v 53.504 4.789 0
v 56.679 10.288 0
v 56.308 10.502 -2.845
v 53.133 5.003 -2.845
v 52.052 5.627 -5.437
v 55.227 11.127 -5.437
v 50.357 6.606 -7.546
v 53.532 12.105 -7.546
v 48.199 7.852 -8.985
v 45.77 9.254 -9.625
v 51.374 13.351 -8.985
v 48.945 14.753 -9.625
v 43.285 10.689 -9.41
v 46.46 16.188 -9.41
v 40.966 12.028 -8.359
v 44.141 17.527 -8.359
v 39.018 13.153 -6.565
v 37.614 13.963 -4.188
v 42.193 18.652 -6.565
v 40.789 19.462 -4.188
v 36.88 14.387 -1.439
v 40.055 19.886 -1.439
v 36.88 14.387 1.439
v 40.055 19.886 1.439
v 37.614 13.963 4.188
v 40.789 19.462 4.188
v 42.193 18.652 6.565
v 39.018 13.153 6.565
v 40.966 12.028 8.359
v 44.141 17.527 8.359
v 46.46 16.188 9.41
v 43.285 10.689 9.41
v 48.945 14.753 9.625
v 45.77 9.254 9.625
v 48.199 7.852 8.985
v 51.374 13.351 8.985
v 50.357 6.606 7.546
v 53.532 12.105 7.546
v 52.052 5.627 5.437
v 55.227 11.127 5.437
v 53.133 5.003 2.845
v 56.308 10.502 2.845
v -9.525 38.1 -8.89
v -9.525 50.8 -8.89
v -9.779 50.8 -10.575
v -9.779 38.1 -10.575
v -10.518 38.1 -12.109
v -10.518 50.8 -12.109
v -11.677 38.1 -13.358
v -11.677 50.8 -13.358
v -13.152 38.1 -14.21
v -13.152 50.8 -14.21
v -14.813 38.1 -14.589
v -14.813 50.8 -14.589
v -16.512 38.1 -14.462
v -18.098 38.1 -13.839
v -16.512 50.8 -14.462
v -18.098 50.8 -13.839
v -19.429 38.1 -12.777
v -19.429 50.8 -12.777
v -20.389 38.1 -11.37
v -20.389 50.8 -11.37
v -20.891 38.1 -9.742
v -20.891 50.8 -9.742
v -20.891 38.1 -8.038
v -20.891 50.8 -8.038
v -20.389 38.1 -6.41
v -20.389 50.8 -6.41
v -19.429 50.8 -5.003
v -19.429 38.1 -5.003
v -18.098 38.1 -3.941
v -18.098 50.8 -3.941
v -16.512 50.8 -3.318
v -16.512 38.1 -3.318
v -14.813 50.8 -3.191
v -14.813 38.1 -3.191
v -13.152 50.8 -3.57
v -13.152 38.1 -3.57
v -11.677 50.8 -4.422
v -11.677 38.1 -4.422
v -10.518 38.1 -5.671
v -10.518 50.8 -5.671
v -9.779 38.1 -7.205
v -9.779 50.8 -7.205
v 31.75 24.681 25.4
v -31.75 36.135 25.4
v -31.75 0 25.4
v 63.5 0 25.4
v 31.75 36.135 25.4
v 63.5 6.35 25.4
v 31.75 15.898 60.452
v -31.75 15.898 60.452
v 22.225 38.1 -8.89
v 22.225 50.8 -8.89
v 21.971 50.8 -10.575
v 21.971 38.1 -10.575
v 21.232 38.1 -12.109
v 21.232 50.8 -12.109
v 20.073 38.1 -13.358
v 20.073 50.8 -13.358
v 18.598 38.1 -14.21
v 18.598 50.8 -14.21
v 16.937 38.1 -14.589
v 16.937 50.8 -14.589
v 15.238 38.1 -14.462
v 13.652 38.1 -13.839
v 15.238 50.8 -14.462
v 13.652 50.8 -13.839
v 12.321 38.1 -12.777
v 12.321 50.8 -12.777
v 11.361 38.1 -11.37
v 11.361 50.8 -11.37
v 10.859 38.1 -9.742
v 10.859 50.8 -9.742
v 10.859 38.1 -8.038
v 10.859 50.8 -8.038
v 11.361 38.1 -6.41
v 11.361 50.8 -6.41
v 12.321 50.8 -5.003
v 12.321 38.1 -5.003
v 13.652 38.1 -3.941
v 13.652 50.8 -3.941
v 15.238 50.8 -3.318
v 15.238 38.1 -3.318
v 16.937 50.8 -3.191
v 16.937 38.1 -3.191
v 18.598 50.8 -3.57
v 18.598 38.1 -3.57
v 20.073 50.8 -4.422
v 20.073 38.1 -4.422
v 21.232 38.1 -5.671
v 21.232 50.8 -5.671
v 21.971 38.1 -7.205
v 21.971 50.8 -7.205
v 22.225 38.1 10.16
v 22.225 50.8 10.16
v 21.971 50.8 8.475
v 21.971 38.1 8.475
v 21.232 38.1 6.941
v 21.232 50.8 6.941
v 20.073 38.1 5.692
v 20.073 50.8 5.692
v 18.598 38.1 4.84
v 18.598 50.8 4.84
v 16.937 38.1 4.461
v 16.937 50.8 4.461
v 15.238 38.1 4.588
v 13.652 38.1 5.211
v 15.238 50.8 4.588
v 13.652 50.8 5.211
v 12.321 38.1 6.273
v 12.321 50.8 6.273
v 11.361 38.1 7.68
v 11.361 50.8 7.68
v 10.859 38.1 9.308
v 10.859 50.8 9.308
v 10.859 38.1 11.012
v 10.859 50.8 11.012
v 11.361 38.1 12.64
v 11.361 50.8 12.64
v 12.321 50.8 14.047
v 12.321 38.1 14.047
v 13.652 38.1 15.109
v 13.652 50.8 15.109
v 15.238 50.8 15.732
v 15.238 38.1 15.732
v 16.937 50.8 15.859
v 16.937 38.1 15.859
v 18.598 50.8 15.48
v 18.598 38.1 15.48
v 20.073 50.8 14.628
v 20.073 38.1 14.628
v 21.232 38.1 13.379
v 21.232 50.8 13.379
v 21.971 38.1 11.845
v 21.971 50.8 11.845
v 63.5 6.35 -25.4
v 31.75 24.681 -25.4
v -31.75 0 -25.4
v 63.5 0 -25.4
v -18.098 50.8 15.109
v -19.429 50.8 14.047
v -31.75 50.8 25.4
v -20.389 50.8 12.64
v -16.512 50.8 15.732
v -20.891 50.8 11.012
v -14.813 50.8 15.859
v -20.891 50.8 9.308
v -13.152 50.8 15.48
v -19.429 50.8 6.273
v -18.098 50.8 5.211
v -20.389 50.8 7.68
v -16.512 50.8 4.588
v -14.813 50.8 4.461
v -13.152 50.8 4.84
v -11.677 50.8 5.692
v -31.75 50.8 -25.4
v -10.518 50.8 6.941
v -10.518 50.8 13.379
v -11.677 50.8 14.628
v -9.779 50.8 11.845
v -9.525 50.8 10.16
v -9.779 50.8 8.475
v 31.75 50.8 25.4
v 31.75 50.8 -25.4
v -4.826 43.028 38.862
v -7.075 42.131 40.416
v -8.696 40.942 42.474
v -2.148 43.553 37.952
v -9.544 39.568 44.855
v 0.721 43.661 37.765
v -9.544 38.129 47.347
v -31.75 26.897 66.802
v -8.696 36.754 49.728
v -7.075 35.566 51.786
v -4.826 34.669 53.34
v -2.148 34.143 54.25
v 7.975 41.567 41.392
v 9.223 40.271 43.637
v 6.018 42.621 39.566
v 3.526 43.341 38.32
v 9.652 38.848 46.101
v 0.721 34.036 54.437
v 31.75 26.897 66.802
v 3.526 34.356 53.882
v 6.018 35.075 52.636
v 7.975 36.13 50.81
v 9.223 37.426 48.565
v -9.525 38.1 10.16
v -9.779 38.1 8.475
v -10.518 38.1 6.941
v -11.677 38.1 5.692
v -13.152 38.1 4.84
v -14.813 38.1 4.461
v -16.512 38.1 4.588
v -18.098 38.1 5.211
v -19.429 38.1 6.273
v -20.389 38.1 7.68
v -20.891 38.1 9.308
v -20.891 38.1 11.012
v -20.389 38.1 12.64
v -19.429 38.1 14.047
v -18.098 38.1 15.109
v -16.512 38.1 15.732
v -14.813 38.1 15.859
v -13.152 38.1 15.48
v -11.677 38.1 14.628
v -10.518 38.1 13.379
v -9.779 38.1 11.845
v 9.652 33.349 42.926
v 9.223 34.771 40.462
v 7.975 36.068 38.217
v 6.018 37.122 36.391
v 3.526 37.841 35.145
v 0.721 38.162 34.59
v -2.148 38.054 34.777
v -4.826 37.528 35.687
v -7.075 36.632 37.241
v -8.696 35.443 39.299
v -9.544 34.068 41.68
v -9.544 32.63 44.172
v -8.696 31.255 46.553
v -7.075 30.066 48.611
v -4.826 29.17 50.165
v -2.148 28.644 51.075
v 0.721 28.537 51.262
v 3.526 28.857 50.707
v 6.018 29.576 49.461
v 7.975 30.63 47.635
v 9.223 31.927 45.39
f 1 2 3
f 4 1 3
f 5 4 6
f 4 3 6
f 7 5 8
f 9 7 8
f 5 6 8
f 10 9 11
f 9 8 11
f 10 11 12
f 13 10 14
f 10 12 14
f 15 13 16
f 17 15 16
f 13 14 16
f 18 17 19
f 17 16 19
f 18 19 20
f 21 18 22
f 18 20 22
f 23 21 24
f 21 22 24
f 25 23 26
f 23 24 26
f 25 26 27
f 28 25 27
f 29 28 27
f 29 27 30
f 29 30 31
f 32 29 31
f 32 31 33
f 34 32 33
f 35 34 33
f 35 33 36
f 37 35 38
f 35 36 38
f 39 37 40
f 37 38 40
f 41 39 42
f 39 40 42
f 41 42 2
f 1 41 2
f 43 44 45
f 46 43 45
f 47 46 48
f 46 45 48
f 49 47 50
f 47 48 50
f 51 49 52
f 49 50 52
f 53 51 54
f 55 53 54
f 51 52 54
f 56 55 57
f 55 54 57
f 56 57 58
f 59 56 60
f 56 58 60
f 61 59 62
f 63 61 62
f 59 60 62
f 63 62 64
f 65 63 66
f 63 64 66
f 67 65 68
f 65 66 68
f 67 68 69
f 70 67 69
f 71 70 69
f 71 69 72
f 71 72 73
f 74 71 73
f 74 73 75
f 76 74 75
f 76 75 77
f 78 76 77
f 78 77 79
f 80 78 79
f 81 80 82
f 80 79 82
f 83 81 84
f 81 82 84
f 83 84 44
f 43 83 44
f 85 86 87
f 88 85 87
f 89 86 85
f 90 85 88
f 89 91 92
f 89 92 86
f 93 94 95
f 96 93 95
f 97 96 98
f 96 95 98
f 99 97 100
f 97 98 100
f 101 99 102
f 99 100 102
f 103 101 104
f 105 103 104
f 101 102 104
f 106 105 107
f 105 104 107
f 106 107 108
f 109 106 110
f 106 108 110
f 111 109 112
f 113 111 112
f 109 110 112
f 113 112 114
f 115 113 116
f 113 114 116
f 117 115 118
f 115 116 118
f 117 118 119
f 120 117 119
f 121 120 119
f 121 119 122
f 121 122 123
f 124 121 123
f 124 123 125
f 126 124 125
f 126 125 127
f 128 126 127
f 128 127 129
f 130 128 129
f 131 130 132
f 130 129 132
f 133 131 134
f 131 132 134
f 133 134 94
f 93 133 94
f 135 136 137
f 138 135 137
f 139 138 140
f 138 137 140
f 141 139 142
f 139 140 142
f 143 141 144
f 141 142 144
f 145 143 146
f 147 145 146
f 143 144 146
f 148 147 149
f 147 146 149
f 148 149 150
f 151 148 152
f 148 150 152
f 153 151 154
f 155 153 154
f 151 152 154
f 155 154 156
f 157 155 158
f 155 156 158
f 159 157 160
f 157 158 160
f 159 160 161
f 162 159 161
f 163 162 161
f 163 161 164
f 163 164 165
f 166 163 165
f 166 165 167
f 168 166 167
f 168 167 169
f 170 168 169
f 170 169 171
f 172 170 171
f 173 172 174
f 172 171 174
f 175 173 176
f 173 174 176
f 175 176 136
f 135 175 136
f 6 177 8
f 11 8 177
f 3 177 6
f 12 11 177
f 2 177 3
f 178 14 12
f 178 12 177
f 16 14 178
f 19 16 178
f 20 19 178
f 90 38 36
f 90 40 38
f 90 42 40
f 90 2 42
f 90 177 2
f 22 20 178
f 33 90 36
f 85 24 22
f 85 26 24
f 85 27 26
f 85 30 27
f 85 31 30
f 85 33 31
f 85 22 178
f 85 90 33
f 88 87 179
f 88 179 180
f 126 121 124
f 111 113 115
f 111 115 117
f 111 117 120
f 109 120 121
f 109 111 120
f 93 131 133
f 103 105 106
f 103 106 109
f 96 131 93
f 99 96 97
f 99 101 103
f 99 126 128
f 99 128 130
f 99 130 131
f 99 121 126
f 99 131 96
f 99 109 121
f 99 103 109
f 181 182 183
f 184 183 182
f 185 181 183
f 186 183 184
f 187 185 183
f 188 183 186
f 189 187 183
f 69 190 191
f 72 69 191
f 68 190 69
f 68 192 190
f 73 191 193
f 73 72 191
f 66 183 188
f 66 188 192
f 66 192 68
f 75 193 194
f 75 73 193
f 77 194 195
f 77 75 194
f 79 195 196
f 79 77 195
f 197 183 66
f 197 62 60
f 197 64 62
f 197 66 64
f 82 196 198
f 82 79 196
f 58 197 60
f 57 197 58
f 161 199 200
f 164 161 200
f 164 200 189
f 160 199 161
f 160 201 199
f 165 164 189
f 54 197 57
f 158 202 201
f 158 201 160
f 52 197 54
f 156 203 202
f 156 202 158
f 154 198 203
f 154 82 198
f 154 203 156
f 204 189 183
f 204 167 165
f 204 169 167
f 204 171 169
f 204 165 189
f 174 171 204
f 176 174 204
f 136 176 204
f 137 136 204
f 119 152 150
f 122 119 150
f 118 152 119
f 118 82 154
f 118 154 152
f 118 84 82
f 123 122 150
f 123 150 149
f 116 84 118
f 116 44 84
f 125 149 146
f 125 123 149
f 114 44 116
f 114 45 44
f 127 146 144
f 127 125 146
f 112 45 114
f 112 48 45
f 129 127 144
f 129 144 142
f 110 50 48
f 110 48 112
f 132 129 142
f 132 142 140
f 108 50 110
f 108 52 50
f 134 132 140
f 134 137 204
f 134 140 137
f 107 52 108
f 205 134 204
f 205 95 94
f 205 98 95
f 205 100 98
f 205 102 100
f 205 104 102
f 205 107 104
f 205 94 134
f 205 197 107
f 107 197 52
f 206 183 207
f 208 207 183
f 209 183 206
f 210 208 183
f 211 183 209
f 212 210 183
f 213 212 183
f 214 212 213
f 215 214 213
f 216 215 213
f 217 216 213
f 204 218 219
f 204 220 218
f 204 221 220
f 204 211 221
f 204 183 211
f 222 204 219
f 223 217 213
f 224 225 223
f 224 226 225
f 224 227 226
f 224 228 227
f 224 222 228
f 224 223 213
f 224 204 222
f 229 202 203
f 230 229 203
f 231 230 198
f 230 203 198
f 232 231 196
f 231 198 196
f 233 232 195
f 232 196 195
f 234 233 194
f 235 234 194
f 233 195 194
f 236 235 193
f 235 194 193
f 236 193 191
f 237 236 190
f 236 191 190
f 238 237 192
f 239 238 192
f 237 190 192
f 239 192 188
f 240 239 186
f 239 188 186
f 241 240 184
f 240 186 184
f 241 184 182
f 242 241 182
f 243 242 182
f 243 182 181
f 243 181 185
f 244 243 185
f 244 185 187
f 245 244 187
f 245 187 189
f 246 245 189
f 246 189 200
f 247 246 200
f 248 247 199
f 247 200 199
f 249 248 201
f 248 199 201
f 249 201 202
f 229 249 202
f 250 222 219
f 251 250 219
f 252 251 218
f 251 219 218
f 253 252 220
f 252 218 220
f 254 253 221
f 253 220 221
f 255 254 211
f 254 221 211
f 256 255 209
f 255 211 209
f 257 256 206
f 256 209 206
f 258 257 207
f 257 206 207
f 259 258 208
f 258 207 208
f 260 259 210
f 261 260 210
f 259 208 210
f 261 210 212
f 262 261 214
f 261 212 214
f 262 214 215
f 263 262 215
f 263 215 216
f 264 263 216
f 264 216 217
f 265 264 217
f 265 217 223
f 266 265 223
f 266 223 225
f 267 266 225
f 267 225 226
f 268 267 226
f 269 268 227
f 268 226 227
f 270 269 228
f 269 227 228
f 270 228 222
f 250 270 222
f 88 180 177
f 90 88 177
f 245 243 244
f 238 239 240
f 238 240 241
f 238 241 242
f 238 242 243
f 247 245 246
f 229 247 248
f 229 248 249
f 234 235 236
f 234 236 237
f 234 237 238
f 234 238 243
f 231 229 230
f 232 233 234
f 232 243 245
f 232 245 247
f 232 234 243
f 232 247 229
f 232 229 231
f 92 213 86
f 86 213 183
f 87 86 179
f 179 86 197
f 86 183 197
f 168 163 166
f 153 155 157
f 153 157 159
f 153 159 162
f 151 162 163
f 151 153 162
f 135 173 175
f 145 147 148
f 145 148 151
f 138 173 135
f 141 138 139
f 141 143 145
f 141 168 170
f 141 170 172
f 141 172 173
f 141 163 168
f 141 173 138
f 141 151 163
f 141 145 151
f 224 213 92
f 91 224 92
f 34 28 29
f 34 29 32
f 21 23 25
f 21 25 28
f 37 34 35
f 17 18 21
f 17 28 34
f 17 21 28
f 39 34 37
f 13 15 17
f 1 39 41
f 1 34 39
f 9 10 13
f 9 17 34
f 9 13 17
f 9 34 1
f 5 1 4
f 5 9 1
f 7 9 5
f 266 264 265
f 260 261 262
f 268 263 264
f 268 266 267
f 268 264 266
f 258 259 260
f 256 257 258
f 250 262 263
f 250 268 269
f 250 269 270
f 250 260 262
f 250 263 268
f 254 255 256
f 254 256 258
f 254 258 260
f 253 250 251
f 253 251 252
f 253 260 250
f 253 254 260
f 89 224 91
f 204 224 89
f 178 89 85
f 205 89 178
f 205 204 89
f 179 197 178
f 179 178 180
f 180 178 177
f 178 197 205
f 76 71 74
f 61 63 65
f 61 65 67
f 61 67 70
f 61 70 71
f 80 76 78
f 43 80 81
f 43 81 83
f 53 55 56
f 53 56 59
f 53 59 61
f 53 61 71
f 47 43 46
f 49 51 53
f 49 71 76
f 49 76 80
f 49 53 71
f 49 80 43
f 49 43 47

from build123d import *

# Parameters (mm, degrees)
SKETCH1_W           = 63.5
SKETCH1_H           = 50.8
BOSS_EXTRUDE1_DEPTH = 50.8
BOSS_EXTRUDE2_DEPTH = 50.8
SKETCH3_R           = 9.652
CUT_EXTRUDE2_DEPTH  = 6.35
BOSS_EXTRUDE3_DEPTH = 63.5
SKETCH6_R           = 9.652
CUT_EXTRUDE4_DEPTH  = 6.35
SKETCH7_R           = 5.715
CUT_EXTRUDE6_DEPTH  = 12.7


with BuildPart() as part:
    # Sketch1 → Boss-Extrude1 (new body)
    with BuildSketch(Plane(origin=(0, 0, 0), x_dir=(1, 0, 0), z_dir=(0, 1, 0))):
        Rectangle(SKETCH1_W, SKETCH1_H)
    extrude(amount=BOSS_EXTRUDE1_DEPTH)

    # Sketch2 → Boss-Extrude2 (add)
    with BuildSketch(Plane.XY.offset(25.4)):
        Polygon((63.5, 6.35), (31.75, 24.680871047), (31.75, 0), (63.5, 0), align=None)
    extrude(amount=-BOSS_EXTRUDE2_DEPTH)

    # Sketch3 → Cut-Extrude2 (cut)
    with BuildSketch(Plane(origin=(18.624630657, 32.25880657, 0), x_dir=(0.866025404, -0.5, 0), z_dir=(0.5, 0.866025404, 0))):
        with Locations((34.289443039, 0)):
            Circle(SKETCH3_R)
    extrude(amount=-CUT_EXTRUDE2_DEPTH, mode=Mode.SUBTRACT)

    # Sketch5 → Boss-Extrude3 (add, through all)
    with BuildSketch(Plane(origin=(31.75, 0, 0), x_dir=(0, 0, -1), z_dir=(1, 0, 0))):
        Polygon((-25.4, 50.8), (-66.802, 26.896544155), (-60.452, 15.898021527), (-25.4, 36.135303163), align=None)
    extrude(amount=-BOSS_EXTRUDE3_DEPTH)

    # Sketch6 → Cut-Extrude4 (cut)
    with BuildSketch(Plane(origin=(0, 49.098522628, 28.347045256), x_dir=(1, 0, 0), z_dir=(0, 0.866025404, 0.5))):
        with Locations((0, -20.500501101)):
            Circle(SKETCH6_R)
    extrude(amount=-CUT_EXTRUDE4_DEPTH, mode=Mode.SUBTRACT)

    # Sketch7 → Cut-Extrude6 (cut)
    with BuildSketch(Plane(origin=(0, 50.8, 0), x_dir=(1, 0, 0), z_dir=(0, 1, 0))):
        with Locations((-15.24, -10.16)):
            Circle(SKETCH7_R)
        with Locations((-15.24, 8.89)):
            Circle(SKETCH7_R)
        with Locations((16.51, -10.16)):
            Circle(SKETCH7_R)
        with Locations((16.51, 8.89)):
            Circle(SKETCH7_R)
    extrude(amount=-CUT_EXTRUDE6_DEPTH, mode=Mode.SUBTRACT)


solid = part.part
